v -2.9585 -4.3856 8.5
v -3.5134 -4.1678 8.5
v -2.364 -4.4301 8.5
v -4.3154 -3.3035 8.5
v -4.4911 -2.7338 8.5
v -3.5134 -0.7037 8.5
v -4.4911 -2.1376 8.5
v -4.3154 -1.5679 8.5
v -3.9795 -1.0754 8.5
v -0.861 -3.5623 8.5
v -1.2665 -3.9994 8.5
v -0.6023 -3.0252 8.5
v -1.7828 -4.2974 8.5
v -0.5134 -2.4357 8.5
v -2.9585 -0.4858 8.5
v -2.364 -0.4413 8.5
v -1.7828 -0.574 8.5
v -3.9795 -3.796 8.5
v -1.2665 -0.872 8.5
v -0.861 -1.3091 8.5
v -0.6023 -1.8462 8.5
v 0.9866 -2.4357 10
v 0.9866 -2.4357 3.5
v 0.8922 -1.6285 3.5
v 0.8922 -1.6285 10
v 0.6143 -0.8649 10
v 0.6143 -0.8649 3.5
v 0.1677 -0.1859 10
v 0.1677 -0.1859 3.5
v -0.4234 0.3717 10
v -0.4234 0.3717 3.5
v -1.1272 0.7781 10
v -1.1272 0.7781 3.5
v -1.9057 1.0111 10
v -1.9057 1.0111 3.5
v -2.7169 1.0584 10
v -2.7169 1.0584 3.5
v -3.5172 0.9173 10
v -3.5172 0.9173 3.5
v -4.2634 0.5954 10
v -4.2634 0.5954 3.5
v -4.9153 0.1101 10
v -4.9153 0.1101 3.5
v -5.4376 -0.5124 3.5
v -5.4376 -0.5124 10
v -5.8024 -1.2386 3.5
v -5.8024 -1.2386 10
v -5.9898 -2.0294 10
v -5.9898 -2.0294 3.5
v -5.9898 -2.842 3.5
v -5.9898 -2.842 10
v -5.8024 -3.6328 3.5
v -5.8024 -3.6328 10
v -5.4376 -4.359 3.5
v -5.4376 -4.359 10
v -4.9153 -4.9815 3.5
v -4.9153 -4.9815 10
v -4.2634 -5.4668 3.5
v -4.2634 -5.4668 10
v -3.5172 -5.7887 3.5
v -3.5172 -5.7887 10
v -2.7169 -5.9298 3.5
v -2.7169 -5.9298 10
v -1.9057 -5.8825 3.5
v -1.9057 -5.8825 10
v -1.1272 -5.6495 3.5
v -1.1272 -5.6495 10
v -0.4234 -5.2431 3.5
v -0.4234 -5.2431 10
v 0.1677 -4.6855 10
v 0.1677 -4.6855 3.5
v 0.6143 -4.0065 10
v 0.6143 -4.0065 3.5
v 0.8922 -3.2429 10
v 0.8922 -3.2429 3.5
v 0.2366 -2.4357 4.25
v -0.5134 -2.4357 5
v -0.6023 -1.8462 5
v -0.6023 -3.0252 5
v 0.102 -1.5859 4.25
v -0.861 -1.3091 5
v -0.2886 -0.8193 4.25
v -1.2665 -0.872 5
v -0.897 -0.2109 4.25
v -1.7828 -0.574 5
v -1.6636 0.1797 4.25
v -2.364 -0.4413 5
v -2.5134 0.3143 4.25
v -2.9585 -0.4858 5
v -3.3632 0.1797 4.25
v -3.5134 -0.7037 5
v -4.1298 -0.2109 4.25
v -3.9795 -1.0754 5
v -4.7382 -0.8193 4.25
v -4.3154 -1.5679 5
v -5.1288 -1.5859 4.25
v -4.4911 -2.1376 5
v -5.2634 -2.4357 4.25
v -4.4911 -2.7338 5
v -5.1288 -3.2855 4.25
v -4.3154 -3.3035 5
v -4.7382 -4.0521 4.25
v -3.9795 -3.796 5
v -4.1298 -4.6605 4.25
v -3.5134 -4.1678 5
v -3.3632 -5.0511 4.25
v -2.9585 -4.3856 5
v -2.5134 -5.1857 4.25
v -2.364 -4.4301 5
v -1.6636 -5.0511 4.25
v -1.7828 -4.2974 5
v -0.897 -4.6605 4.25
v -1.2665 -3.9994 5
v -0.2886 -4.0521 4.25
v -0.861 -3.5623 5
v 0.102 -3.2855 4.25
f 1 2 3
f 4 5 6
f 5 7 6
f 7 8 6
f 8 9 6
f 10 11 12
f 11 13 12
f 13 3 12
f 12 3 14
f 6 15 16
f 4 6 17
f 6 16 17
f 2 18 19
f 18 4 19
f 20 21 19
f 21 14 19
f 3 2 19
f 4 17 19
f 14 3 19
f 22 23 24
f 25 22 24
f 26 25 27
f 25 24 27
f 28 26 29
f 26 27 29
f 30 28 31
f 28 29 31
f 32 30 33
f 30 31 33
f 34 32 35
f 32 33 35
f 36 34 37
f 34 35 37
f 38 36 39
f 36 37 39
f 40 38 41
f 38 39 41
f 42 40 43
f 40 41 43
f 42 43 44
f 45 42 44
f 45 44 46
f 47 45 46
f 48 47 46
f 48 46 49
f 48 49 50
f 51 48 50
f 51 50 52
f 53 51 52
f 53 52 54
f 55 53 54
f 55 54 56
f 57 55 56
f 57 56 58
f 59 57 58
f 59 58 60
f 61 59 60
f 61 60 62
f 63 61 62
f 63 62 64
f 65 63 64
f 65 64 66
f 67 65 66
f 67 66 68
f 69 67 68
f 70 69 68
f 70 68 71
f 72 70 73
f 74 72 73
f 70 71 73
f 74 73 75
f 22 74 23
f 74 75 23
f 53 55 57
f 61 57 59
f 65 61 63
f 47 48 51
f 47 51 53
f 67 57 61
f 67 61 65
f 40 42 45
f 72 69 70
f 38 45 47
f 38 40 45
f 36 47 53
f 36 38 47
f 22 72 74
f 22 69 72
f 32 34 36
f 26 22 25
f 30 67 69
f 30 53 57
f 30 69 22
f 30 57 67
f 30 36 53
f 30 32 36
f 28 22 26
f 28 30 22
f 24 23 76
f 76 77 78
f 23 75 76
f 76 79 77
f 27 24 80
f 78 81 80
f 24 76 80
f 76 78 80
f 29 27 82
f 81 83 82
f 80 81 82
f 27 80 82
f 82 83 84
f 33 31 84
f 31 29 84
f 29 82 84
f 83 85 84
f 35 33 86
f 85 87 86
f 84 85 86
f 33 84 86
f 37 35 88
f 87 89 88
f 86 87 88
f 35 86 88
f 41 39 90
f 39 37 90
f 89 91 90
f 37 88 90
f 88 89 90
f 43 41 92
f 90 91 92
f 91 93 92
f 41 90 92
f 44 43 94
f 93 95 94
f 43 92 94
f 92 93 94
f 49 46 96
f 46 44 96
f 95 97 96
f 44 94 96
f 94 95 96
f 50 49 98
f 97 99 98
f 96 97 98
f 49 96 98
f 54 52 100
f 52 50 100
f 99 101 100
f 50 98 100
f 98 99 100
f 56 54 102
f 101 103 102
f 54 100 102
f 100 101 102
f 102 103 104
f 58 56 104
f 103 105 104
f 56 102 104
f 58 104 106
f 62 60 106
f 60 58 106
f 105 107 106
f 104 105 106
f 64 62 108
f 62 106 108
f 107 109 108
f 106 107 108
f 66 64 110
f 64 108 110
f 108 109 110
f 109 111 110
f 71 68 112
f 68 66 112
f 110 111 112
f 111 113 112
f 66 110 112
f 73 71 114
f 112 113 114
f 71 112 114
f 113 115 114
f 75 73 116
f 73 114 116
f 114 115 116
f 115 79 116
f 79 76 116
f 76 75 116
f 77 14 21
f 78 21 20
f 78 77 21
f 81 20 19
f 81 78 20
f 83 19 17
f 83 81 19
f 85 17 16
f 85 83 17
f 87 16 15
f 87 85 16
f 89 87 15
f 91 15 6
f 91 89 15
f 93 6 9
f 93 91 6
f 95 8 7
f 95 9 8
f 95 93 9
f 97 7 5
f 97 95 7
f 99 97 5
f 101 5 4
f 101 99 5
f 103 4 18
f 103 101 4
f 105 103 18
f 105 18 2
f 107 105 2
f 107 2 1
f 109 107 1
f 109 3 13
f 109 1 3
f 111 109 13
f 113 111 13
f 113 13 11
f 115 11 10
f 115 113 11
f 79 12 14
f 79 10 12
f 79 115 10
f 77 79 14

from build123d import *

# Parameters (mm, degrees)
F0_R     = 3.5
F1_DEPTH = 10
F2_T     = -1.5


# Not quite as in the source:
# - a fillet or chamfer that OpenCascade refuses, or shapes differently, is made with other operations: its cross-section is extruded or revolved along the edge and cut away or added


with BuildPart() as f1:
    # F0 (on Top) → F1 (new body)
    with BuildSketch(Plane.XY):
        with Locations((-2.5134360774, -2.4357009433)):
            Circle(F0_R)
    extrude(amount=F1_DEPTH)

    # F2
    f2_openings = [f1.faces().sort_by_distance(p)[0] for p in [
        (-2.513436, -2.435701, 0),
    ]]
    offset(amount=F2_T, openings=f2_openings)

    # F3: chamfer of 5 on 1 edges, made by hand

    # F3_s1 → F3_t2 (revolve, cut)
    with BuildSketch(Plane.XZ.offset(2.4357009433)):
        Polygon((4.4865639226, 0), (-0.5134360774, 5), (-0.5134360774, 0), align=None)
    revolve(axis=Axis((-2.5134360774, -2.4357009433, 0), (0, 0, 1)), mode=Mode.SUBTRACT)


solid = f1.part
